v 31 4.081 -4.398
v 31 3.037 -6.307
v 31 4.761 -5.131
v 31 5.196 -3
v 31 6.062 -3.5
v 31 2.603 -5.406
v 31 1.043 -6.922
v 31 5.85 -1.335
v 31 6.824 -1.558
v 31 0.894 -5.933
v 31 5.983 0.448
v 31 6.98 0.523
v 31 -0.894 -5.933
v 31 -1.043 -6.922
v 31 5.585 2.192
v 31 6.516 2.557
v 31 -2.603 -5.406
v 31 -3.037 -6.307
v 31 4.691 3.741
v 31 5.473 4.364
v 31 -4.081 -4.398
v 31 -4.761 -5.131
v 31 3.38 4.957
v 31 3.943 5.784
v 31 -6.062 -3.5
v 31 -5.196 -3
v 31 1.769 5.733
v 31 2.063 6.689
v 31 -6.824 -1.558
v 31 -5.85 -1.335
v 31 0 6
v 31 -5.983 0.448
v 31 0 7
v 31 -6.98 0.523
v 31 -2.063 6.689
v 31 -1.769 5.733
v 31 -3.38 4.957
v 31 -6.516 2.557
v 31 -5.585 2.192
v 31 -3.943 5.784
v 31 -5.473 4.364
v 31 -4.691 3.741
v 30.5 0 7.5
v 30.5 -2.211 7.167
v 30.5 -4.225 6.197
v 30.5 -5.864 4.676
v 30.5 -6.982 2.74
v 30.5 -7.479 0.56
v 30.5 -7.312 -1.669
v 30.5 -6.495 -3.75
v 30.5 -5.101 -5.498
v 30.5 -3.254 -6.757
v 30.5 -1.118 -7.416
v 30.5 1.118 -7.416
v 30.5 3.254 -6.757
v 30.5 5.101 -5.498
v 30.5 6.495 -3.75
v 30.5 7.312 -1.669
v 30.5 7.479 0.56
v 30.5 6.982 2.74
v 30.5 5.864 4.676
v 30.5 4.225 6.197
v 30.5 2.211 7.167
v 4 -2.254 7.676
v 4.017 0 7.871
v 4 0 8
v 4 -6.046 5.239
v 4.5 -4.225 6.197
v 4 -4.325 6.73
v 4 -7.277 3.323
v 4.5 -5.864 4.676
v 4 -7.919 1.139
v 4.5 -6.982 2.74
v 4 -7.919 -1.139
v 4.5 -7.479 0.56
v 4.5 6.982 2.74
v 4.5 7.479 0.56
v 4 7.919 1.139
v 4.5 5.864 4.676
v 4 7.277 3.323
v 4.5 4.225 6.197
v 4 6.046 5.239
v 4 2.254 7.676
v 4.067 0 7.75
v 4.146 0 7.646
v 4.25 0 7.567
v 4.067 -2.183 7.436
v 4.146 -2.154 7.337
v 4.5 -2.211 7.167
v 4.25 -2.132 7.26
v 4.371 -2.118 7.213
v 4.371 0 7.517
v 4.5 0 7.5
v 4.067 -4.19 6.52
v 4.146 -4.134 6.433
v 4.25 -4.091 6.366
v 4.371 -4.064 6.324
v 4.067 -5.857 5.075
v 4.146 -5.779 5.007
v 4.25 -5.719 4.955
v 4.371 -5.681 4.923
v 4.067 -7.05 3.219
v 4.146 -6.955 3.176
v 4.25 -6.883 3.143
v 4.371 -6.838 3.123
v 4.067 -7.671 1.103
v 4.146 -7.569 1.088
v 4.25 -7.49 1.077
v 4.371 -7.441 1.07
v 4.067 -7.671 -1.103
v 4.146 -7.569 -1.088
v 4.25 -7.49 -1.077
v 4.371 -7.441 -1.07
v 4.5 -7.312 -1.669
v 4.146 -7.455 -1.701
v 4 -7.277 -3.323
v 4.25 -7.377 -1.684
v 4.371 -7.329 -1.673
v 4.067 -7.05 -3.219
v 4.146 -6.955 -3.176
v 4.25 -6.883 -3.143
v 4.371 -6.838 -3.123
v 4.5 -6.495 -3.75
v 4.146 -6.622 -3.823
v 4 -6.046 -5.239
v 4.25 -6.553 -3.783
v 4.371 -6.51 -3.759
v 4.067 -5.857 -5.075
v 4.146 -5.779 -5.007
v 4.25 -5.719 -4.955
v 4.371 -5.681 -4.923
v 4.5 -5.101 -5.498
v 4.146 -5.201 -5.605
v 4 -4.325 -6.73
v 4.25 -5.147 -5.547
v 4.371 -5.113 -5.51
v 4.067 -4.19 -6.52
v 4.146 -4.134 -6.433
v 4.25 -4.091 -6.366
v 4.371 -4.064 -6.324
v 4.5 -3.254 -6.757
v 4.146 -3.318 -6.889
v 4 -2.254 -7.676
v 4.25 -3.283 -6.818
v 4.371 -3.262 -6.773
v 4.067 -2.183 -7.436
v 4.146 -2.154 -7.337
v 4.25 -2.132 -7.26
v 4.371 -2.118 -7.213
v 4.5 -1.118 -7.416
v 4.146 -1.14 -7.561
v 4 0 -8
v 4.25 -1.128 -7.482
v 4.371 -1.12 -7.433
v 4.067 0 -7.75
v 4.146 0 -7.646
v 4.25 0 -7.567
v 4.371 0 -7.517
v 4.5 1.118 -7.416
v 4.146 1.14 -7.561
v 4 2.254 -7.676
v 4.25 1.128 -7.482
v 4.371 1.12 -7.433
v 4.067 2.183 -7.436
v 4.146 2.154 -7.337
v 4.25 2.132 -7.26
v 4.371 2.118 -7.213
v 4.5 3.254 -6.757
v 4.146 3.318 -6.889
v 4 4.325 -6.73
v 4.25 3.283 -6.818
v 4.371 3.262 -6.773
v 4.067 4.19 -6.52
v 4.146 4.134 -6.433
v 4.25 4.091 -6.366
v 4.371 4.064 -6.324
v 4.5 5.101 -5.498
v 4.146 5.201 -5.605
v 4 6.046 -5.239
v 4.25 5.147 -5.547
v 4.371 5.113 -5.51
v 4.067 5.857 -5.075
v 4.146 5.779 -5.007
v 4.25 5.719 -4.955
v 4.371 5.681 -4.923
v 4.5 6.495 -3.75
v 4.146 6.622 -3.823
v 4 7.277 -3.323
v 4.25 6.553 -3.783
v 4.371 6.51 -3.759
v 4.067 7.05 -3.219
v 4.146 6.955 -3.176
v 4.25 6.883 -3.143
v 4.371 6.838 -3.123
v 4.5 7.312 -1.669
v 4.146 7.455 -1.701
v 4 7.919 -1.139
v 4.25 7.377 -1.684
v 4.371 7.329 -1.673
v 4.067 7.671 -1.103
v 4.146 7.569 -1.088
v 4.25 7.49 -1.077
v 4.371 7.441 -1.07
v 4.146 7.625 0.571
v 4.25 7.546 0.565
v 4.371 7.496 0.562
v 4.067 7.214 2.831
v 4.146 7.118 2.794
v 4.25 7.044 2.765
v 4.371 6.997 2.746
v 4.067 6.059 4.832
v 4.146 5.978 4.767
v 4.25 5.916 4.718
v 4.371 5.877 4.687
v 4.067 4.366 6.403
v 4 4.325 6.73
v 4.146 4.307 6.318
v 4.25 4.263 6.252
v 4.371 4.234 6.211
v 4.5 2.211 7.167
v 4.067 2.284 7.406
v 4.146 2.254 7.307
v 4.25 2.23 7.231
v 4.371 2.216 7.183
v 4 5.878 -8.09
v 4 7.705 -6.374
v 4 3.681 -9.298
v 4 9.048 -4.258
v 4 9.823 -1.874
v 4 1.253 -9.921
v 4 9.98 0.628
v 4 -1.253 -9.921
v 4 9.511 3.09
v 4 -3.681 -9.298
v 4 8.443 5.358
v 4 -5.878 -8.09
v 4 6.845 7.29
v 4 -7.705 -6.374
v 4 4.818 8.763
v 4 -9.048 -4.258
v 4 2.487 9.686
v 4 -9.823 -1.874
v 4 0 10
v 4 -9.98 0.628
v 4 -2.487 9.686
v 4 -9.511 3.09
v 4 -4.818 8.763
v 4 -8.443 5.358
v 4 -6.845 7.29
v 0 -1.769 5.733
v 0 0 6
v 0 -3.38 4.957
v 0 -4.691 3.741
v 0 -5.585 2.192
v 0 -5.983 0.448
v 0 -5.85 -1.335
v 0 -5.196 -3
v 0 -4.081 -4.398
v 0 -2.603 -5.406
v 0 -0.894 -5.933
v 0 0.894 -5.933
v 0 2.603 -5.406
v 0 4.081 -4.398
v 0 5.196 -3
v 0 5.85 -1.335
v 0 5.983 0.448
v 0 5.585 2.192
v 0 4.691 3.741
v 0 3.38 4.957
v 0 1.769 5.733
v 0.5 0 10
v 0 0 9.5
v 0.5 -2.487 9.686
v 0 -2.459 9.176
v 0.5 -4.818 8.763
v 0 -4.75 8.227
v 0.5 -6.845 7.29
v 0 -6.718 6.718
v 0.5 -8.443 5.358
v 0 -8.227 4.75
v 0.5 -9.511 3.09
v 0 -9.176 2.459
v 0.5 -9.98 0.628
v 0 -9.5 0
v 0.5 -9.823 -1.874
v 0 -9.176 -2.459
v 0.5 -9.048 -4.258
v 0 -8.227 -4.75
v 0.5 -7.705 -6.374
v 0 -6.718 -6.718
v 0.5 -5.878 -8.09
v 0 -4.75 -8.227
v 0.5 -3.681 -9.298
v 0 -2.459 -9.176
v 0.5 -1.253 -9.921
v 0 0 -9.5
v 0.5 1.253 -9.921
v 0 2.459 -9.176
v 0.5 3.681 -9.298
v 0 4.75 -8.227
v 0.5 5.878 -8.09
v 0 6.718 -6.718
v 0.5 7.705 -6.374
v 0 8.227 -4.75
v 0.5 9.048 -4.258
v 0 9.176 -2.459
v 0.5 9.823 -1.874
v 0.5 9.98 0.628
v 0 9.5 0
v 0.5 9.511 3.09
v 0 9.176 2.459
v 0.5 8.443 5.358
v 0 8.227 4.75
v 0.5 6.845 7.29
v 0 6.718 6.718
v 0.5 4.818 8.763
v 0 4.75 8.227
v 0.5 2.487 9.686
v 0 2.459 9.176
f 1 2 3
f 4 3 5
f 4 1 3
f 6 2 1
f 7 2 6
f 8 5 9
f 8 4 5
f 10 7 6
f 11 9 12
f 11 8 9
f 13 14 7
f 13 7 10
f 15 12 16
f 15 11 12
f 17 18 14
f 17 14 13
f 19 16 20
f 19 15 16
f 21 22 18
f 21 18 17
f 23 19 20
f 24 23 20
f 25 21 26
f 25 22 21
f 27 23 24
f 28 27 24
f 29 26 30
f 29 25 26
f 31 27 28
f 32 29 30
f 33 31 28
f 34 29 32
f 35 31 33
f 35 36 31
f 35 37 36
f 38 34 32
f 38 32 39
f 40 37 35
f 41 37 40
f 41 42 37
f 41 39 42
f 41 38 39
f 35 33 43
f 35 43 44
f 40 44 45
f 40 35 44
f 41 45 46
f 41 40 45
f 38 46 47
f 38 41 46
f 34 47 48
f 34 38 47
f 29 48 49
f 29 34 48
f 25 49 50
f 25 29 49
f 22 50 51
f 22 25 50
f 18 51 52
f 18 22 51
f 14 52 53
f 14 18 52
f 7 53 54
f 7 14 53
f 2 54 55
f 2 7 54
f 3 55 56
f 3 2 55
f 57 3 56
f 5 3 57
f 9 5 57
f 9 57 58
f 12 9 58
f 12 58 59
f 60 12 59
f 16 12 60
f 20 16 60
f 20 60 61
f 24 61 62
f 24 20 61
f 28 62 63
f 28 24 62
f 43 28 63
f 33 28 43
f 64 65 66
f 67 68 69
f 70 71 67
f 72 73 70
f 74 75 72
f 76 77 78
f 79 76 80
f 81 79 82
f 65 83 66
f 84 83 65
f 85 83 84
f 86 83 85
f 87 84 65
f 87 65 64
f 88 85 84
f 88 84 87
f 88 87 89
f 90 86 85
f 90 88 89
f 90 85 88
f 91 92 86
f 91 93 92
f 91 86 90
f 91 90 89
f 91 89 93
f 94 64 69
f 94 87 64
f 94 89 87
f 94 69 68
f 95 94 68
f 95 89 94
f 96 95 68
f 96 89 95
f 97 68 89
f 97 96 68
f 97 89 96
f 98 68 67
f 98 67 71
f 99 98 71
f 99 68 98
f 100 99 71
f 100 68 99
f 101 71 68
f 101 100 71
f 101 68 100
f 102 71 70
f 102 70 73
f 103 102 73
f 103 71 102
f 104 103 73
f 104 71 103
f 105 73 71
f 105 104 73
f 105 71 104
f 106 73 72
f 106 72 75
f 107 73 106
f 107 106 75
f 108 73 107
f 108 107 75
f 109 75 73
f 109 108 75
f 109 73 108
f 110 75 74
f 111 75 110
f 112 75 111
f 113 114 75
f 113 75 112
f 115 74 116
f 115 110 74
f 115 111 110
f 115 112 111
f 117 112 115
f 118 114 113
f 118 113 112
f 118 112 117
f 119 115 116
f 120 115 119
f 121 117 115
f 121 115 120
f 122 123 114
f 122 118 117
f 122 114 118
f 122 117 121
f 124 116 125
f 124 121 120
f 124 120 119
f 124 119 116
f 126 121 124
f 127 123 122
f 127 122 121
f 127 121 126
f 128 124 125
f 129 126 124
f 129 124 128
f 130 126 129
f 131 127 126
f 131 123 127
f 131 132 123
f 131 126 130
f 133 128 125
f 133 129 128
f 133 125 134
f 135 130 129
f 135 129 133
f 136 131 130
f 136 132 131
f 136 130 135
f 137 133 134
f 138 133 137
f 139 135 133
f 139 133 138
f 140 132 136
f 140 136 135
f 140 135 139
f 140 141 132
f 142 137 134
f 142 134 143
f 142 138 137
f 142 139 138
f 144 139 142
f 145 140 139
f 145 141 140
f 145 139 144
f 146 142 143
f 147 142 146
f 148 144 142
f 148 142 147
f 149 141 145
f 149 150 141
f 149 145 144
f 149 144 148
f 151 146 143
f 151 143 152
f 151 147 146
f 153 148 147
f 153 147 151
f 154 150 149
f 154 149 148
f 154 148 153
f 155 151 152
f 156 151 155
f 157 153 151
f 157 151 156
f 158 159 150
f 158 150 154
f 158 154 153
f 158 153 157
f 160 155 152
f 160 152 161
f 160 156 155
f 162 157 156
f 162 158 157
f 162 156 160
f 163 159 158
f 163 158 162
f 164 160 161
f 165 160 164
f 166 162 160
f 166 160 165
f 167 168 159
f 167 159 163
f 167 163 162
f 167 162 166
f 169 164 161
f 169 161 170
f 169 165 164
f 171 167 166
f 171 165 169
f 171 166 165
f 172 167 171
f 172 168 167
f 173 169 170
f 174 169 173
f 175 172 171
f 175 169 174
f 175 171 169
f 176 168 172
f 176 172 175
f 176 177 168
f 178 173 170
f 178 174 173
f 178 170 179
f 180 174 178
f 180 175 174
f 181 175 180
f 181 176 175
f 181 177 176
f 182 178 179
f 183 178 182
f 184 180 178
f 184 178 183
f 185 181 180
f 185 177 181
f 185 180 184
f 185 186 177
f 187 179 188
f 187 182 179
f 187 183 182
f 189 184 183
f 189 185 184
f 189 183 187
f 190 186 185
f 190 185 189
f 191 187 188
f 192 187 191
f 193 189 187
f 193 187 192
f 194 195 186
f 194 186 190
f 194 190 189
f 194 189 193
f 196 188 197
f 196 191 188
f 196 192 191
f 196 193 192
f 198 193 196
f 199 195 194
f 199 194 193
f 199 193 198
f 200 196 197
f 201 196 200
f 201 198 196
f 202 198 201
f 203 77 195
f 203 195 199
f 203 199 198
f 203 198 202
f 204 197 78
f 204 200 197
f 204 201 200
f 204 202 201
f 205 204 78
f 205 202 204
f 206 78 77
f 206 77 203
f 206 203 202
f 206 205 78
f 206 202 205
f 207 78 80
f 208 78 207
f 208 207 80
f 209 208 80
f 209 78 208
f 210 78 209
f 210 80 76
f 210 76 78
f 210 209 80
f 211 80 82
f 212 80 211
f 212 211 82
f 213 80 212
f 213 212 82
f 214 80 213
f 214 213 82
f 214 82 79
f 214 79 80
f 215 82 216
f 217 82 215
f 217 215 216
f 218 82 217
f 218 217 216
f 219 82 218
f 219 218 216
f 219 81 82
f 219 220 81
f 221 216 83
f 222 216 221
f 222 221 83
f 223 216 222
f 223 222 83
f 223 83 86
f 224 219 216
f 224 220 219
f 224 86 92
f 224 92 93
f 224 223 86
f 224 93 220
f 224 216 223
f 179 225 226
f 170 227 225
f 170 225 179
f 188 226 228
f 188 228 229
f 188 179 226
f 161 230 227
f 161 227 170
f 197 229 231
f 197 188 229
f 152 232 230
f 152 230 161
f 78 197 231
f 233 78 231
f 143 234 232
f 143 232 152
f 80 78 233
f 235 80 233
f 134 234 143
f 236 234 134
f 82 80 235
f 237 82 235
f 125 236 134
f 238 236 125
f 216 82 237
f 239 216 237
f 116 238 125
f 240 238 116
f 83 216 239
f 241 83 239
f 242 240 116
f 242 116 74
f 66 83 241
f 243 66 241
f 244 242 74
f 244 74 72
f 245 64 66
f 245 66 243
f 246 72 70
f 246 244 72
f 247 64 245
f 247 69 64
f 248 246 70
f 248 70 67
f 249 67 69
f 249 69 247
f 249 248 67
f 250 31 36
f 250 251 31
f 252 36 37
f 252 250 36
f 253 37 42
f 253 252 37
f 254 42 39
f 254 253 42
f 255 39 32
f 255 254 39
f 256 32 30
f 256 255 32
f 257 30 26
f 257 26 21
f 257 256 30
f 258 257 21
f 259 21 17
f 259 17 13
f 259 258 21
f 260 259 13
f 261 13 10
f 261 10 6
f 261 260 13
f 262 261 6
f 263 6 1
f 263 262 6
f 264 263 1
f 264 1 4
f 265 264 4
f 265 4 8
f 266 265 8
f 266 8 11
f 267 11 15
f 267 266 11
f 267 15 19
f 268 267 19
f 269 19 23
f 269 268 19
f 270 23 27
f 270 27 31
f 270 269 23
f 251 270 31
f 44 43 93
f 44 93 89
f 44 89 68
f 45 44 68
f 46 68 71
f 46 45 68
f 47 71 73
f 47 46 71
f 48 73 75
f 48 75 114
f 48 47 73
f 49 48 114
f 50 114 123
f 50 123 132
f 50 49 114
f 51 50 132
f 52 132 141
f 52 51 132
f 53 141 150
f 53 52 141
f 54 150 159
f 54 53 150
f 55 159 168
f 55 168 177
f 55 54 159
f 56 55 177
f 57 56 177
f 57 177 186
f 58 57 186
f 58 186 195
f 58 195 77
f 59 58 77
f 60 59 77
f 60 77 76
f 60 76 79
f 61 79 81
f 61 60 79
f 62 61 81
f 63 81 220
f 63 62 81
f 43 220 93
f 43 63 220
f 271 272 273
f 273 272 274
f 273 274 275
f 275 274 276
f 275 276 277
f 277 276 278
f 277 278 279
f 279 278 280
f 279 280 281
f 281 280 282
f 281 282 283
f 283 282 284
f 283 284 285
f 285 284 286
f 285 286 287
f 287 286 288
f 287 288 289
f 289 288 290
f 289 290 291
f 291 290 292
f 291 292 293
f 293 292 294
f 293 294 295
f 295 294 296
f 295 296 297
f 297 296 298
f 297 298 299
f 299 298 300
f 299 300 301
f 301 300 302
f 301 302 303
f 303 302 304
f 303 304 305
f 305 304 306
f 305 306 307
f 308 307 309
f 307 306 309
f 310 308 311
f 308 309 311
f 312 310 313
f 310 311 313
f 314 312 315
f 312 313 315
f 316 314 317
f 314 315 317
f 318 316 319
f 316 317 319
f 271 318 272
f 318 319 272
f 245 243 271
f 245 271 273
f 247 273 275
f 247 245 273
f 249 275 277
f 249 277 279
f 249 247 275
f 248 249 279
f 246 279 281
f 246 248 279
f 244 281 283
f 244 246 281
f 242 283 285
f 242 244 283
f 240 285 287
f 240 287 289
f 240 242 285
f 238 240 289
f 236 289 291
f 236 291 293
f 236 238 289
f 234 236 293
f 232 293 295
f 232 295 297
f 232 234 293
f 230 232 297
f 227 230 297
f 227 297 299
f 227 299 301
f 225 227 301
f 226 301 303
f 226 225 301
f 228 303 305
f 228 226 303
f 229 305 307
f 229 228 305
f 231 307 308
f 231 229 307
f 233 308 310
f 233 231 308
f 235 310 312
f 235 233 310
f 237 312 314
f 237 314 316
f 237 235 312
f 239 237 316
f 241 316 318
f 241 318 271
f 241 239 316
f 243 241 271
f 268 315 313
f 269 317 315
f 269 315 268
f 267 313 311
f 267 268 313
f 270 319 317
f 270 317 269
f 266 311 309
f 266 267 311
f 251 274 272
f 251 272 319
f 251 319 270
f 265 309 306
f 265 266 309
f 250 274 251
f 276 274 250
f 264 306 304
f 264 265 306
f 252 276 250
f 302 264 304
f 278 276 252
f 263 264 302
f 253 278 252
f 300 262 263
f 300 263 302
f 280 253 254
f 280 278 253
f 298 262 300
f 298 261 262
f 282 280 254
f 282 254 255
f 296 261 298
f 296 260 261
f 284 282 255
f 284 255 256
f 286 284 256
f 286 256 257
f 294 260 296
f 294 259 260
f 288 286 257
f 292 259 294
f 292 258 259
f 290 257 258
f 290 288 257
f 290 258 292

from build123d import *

# Parameters (mm, degrees)
FILLET1_R     = 0.5
CHAMFER1_SIZE = 0.5


with BuildPart() as part:
    # Sketch1 → Revolve1 (revolve)
    with BuildSketch(Plane.XY, mode=Mode.PRIVATE) as revolve1_sk:
        Polygon((0, 6), (0, 10), (4, 10), (4, 7.5), (31, 7.5), (31, 6), align=None)
    revolve(revolve1_sk.sketch.rotate(Axis((-6.114398422, 0, 0), (1, 0, 0)), 90), axis=Axis((-6.114398422, 0, 0), (1, 0, 0)))

    # Fillet1
    fillet1_edges = [part.edges().sort_by_distance(p)[0] for p in [
        (4, 0, -7.5),
    ]]
    fillet(fillet1_edges, radius=FILLET1_R)

    # Chamfer1
    chamfer1_edges = [part.edges().sort_by_distance(p)[0] for p in [
        (31, 0, -7.5),
        (0, 0, -10),
    ]]
    chamfer(chamfer1_edges, length=CHAMFER1_SIZE)


solid = part.part
